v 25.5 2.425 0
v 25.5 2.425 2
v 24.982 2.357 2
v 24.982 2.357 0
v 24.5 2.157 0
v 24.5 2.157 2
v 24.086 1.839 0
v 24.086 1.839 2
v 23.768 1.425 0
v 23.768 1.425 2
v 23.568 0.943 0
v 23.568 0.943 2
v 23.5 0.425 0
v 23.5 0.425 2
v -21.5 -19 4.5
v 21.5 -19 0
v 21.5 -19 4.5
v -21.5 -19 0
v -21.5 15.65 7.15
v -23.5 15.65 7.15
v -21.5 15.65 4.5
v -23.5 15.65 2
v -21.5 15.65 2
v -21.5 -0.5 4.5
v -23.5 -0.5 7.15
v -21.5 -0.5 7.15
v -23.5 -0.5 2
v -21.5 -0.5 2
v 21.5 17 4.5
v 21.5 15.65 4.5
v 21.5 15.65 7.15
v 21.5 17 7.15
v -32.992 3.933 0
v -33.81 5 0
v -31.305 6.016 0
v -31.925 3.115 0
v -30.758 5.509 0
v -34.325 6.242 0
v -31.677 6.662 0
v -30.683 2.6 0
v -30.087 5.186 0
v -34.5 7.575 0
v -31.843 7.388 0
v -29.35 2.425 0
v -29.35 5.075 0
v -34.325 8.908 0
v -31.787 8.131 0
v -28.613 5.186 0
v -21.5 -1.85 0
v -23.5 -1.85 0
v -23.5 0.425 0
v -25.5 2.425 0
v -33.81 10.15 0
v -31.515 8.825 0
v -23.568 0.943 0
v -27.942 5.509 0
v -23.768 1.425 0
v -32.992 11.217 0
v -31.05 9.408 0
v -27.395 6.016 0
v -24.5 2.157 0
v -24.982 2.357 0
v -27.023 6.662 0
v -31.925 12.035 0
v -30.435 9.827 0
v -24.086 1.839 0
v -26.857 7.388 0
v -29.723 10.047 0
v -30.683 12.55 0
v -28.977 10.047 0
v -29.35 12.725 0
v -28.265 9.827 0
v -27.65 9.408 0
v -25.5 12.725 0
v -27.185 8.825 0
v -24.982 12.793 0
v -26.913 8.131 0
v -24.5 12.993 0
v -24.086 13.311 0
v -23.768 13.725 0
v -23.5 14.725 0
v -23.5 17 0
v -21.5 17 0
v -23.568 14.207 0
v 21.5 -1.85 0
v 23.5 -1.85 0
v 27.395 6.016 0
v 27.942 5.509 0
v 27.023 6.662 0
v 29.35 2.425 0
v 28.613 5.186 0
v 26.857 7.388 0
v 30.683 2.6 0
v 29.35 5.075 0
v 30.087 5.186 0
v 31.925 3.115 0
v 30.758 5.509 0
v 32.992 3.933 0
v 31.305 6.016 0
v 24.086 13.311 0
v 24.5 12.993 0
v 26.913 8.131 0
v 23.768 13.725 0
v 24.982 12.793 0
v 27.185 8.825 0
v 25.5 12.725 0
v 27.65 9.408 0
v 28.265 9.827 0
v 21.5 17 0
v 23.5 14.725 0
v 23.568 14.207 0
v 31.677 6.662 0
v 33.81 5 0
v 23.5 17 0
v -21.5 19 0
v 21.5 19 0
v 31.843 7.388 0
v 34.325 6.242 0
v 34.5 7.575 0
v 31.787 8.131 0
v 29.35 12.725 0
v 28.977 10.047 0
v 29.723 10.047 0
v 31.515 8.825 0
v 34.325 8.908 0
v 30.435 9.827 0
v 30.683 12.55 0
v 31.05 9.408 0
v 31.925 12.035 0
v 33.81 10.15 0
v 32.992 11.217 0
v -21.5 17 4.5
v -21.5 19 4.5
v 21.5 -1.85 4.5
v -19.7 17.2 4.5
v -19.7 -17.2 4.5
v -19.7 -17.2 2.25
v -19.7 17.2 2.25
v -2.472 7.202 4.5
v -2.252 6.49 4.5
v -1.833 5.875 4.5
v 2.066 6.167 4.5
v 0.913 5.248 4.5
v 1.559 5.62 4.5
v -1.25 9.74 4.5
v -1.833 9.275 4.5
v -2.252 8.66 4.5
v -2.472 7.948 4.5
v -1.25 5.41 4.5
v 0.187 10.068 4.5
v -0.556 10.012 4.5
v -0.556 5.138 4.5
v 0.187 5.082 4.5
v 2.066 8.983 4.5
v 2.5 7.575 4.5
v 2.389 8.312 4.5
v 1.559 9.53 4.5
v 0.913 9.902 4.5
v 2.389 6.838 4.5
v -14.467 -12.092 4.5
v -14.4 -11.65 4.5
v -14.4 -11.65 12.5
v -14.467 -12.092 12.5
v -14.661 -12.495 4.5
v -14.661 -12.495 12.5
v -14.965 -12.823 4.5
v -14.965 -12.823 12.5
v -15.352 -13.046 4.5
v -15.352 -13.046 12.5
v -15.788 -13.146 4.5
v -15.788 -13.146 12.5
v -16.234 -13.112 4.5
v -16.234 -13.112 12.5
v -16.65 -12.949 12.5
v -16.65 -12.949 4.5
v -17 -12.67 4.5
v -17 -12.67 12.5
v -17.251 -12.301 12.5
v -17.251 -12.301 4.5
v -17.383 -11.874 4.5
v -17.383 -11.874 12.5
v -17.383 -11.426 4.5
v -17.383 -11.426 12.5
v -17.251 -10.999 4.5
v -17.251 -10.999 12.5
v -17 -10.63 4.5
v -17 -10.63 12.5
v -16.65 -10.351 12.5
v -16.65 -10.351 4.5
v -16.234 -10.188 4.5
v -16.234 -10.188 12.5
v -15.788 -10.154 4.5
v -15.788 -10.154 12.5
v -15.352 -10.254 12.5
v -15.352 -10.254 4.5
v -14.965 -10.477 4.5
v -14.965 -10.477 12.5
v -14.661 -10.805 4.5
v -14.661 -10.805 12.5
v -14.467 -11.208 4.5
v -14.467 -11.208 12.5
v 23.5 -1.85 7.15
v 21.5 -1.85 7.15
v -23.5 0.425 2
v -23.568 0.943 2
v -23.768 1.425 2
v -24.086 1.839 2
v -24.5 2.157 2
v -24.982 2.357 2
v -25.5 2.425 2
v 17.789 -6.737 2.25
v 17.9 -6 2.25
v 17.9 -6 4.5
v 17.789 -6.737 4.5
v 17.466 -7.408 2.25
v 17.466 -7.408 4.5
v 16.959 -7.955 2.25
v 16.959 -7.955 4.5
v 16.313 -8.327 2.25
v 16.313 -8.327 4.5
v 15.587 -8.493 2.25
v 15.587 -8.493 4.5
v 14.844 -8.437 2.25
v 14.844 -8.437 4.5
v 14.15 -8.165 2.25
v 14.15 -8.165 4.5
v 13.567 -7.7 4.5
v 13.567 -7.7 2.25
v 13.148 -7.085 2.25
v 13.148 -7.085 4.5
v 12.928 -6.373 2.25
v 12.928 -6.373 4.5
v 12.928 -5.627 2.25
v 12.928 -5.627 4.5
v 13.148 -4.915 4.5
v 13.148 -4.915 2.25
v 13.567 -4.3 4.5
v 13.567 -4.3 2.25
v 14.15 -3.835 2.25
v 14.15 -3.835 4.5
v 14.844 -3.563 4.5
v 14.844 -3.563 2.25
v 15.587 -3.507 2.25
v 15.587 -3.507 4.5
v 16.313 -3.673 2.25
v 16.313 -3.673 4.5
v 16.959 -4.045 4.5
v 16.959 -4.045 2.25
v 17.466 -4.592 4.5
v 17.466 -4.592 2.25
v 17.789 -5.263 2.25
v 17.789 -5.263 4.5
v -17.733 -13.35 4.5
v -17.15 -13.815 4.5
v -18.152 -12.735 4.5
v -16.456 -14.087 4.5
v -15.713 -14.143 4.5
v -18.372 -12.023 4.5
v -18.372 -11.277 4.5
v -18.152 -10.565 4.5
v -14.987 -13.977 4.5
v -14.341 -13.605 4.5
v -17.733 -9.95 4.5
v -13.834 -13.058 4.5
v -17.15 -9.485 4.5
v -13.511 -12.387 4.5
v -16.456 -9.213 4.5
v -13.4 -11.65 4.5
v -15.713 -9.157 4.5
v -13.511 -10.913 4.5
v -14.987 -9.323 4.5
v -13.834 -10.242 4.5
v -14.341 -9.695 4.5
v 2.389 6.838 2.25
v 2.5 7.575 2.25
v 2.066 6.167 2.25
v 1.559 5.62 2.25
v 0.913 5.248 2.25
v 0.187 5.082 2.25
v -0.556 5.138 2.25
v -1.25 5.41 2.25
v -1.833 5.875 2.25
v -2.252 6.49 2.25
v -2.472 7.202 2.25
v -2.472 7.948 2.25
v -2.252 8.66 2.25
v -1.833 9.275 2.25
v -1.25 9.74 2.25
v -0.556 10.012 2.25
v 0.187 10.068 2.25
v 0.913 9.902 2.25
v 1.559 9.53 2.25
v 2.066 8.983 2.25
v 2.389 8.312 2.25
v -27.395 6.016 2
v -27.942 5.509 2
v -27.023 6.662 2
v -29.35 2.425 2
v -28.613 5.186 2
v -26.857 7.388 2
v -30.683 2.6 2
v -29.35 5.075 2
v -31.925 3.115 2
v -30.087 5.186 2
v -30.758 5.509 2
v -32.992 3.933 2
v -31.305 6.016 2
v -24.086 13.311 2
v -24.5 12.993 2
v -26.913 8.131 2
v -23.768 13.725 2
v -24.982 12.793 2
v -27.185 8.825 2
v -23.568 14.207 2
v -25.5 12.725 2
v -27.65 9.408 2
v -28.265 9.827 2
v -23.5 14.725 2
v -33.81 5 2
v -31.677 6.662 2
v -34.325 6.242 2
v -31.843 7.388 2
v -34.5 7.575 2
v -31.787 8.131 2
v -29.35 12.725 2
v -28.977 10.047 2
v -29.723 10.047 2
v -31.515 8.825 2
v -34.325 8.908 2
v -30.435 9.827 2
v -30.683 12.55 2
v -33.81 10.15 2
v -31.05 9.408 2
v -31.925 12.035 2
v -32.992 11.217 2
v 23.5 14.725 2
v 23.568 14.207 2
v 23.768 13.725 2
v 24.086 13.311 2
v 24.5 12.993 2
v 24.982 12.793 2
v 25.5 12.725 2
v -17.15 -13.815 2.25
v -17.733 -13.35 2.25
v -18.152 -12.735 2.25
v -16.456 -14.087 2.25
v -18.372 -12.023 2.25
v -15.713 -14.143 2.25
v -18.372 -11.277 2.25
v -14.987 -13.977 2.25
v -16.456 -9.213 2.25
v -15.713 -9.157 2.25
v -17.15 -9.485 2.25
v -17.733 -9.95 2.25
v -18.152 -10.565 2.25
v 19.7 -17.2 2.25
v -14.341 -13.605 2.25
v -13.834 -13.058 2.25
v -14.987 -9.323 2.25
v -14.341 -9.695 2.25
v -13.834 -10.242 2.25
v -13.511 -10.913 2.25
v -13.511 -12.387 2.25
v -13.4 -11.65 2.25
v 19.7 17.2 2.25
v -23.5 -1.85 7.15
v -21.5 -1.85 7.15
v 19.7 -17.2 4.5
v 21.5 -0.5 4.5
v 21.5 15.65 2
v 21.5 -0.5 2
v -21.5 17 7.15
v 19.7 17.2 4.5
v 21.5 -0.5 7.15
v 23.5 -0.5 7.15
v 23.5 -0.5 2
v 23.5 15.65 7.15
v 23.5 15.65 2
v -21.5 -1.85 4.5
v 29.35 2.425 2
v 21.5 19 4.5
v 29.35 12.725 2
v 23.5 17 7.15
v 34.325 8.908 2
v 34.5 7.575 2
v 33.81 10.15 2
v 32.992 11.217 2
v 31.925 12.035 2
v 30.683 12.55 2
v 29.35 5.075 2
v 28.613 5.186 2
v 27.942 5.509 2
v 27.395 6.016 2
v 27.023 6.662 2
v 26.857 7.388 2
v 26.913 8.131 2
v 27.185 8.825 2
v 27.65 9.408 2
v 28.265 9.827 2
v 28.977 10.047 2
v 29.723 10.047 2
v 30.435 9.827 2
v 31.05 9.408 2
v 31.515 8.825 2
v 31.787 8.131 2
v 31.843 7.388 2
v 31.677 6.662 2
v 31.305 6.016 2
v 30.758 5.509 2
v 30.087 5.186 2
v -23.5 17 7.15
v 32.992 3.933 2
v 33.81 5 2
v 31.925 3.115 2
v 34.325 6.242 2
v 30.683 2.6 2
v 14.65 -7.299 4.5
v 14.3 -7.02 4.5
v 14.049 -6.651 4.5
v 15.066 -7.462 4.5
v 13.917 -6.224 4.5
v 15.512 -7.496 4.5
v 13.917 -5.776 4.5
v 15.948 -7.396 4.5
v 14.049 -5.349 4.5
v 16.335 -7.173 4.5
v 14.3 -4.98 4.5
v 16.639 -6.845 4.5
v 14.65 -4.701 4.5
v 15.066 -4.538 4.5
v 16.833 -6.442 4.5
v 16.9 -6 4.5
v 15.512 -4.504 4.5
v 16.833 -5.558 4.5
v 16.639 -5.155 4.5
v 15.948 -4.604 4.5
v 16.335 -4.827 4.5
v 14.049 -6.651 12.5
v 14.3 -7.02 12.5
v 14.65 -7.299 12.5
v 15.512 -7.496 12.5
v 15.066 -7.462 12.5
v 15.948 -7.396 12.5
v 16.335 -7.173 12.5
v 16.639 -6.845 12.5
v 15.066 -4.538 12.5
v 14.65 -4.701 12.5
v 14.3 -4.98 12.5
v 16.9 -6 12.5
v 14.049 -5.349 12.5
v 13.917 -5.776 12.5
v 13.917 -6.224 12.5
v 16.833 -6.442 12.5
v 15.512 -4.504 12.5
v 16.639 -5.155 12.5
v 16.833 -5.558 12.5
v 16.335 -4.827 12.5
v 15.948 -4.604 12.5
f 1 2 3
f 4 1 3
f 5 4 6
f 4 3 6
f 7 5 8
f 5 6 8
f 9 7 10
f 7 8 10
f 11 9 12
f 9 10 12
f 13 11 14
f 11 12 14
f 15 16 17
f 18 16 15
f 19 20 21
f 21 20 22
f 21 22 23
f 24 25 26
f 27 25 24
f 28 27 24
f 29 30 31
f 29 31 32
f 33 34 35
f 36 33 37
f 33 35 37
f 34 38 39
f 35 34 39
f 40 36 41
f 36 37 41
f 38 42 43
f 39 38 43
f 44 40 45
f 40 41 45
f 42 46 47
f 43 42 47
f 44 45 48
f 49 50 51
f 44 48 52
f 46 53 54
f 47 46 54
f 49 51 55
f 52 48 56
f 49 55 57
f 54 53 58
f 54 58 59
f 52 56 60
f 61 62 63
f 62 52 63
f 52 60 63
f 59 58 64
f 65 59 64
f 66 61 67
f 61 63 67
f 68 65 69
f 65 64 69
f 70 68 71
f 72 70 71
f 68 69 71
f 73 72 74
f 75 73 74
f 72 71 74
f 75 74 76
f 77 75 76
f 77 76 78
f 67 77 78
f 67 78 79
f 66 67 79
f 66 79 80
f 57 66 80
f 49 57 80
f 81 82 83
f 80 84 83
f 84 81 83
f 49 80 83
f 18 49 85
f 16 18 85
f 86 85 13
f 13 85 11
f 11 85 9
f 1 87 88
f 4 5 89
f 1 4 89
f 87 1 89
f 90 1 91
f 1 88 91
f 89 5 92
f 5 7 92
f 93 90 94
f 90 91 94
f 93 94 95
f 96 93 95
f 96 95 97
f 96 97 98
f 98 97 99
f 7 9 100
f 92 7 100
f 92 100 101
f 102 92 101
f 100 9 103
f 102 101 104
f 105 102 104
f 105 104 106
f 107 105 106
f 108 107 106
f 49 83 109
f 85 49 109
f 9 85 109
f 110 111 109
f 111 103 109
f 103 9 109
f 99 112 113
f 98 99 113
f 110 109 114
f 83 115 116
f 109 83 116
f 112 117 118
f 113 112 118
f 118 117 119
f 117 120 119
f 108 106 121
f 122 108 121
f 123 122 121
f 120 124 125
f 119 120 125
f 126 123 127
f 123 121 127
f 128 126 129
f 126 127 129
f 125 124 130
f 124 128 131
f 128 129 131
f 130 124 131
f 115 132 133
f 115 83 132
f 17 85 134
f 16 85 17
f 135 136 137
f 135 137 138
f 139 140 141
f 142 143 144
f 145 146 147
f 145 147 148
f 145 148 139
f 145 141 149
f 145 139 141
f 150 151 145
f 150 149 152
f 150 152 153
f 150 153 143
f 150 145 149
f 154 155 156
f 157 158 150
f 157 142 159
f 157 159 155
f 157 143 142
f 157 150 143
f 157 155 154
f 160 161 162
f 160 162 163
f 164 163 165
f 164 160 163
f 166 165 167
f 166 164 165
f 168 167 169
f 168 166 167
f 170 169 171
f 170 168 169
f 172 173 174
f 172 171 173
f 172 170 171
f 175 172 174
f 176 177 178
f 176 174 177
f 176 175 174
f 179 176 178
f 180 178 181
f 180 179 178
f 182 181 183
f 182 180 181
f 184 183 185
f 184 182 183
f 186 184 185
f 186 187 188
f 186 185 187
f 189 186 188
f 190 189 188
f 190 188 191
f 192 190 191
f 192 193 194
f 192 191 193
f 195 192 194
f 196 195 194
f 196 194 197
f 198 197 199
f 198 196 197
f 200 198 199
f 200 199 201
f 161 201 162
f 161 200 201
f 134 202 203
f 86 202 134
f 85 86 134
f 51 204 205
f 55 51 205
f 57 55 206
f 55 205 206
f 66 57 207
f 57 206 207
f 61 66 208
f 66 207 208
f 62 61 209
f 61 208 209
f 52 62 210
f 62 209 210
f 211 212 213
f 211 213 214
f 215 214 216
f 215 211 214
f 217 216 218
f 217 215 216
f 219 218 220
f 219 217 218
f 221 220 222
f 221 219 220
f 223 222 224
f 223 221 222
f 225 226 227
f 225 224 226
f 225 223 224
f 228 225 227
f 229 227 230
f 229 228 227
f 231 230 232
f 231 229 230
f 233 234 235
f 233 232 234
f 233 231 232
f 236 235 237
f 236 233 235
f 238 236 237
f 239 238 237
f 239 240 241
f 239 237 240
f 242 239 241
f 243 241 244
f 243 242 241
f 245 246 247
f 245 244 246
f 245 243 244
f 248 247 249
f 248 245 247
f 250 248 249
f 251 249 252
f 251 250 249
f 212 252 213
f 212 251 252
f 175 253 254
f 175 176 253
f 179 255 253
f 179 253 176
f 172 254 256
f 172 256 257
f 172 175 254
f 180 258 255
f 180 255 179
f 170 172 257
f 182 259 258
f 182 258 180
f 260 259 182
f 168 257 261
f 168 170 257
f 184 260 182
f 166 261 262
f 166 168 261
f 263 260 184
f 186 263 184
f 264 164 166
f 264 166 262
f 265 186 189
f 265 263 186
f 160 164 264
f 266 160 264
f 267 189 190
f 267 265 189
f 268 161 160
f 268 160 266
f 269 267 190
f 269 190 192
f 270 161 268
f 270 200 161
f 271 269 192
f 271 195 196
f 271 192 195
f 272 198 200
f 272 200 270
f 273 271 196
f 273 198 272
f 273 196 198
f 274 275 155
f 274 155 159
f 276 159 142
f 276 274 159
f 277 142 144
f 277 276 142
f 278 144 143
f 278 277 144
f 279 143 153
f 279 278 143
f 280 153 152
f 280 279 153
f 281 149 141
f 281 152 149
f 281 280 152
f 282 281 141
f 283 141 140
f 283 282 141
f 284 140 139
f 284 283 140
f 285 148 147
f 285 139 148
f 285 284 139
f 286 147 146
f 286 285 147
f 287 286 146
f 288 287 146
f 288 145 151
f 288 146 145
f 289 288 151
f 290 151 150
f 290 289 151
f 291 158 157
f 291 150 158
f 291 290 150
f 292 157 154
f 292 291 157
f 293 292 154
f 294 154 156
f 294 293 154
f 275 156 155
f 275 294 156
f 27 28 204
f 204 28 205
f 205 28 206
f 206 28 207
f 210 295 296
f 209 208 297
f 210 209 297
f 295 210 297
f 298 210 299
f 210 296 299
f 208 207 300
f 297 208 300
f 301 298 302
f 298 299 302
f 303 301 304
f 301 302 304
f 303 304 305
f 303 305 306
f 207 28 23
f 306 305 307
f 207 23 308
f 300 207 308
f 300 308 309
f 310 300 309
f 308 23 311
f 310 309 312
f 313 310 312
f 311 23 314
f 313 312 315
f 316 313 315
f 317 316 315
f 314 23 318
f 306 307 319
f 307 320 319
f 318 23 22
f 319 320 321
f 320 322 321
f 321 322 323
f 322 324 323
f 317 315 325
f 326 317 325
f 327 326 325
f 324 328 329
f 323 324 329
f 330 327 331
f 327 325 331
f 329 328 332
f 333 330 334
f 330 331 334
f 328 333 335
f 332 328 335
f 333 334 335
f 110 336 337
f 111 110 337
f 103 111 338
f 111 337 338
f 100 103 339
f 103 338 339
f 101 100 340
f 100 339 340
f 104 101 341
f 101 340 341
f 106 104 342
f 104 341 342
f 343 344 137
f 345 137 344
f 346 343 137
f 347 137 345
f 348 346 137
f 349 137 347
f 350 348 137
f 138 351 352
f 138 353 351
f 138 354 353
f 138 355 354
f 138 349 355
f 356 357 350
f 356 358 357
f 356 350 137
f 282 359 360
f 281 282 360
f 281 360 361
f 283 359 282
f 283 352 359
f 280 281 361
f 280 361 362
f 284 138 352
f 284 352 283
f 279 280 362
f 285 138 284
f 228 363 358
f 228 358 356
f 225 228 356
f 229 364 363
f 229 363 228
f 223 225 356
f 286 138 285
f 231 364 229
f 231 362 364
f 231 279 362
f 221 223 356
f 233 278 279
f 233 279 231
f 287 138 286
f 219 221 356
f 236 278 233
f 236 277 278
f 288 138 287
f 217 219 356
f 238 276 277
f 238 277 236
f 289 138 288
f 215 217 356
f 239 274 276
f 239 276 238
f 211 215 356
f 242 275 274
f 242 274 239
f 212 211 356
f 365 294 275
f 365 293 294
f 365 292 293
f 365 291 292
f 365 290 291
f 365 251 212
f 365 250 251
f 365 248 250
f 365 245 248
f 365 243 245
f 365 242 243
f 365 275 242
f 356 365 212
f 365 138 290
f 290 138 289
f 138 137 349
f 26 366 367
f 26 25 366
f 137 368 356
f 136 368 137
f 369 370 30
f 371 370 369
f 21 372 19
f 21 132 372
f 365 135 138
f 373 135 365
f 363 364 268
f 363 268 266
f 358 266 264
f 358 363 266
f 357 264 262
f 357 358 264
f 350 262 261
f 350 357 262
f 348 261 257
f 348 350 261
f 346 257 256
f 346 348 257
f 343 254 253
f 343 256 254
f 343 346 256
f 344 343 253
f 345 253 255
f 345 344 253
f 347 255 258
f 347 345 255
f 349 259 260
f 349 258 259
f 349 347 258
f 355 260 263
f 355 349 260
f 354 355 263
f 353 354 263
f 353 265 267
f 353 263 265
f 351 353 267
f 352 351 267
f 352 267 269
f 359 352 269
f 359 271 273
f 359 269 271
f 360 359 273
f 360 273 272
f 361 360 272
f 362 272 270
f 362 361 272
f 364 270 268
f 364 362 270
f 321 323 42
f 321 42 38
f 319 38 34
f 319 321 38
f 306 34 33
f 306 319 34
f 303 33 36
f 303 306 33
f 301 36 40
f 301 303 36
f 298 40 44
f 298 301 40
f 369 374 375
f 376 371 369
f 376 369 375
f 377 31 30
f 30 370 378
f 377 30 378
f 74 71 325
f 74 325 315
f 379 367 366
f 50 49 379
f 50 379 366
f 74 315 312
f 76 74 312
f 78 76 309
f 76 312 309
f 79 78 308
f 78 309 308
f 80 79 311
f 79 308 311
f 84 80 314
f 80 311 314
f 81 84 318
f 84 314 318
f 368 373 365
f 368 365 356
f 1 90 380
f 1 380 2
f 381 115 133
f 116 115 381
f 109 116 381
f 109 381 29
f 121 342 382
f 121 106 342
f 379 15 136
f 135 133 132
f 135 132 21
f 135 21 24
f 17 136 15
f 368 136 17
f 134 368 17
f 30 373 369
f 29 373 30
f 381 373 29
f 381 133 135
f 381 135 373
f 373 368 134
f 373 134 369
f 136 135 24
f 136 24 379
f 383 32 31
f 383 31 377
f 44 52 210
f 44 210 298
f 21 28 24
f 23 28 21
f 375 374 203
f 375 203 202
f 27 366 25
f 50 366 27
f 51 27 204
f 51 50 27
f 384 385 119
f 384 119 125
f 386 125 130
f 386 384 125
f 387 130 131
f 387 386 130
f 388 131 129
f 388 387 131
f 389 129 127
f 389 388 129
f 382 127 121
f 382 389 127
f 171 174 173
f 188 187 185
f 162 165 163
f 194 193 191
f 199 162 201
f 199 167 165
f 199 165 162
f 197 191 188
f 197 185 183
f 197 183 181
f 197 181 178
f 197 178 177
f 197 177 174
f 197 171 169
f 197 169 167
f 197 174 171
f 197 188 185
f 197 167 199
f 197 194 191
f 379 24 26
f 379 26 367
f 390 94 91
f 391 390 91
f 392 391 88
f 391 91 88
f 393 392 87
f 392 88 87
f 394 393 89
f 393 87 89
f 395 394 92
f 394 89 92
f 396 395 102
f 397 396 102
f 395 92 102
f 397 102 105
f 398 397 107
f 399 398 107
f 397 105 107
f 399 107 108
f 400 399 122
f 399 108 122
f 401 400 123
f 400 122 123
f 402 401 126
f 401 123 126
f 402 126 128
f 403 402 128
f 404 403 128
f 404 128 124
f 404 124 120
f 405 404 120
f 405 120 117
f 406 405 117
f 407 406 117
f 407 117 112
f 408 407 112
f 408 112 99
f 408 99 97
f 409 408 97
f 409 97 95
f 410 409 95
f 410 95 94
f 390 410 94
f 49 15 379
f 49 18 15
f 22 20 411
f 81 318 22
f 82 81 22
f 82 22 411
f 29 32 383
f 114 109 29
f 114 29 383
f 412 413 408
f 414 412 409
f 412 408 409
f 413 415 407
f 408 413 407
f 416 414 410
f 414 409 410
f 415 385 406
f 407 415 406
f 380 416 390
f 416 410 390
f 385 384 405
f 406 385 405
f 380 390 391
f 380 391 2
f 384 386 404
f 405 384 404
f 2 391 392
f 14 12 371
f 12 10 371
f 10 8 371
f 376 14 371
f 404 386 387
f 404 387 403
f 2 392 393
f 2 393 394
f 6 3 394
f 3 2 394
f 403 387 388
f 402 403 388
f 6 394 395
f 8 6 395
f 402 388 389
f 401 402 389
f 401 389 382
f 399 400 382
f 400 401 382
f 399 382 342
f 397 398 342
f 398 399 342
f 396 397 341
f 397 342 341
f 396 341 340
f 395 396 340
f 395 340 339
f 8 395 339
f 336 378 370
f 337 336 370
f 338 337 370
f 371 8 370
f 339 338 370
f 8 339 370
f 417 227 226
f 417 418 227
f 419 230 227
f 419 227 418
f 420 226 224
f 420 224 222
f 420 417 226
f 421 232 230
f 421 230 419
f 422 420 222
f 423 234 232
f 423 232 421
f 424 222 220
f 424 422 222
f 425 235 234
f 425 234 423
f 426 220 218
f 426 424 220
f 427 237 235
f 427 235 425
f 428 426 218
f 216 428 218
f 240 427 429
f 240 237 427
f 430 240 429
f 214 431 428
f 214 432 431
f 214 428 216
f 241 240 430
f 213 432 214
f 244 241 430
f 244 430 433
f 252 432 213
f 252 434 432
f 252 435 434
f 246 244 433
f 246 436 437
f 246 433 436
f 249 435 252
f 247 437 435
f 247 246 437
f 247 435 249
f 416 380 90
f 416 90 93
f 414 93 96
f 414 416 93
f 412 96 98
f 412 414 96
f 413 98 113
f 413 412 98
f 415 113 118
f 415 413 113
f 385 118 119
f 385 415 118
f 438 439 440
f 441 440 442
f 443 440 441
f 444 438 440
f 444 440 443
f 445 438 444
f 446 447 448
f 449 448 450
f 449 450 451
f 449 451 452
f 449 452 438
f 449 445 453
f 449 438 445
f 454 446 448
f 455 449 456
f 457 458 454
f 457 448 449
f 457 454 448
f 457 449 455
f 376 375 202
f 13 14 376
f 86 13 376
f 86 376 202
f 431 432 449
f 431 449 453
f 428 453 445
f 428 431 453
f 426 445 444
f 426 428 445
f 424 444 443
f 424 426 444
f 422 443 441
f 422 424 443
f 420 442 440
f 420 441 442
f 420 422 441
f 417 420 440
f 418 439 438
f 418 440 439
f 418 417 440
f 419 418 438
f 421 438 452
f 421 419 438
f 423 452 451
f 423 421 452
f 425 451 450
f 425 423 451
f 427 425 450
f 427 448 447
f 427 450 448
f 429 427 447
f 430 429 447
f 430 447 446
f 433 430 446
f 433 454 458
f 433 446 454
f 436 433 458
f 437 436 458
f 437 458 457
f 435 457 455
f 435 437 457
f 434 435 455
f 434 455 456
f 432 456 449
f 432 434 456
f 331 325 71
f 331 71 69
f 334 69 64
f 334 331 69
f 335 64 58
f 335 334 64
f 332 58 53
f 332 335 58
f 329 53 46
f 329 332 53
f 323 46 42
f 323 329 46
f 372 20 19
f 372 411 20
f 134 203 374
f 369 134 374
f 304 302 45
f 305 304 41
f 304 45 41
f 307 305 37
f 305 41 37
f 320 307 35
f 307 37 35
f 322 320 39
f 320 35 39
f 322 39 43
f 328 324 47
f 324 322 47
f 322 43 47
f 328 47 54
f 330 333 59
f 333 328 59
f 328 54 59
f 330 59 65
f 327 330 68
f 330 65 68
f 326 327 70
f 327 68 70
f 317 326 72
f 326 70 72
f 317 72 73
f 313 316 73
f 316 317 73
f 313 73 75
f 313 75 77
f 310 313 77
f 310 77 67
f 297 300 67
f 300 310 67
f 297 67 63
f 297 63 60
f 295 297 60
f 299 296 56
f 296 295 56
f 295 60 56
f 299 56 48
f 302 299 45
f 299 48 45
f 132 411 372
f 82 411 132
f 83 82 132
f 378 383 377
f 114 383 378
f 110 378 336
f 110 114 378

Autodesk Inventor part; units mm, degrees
ref_plane "YZ Plane" through (0, 0, 0) normal (1, 0, 0) x (0, 1, 0)
ref_plane "XZ Plane" through (0, 0, 0) normal (0, 1, 0) x (-1, 0, 0)
ref_plane "XY Plane" through (0, 0, 0) normal (0, 0, 1) x (1, 0, 0)
sketch "Sketch1" plane through (0, 0, 0) normal (0, 0, 1) x (1, 0, 0)
  line L0 (-21.5, 19) -> (21.5, 19)
  line L1 (21.5, 19) -> (21.5, -19)
  line L2 (21.5, -19) -> (-21.5, -19)
  line L3 (-21.5, -19) -> (-21.5, 19)
  line L4 (0, 0) -> (0, 19) construction
  line L5 (0, 0) -> (0, -19) construction
  line L6 (0, 0) -> (21.5, 0) construction
  line L7 (0, 0) -> (-21.5, 0) construction
  dimension "d0" = 43
  dimension "d1" = 38
extrude "Extrusion1" add sketch "Sketch1" along normal blind 4.5
sketch "Sketch2" plane through (0, 0, 4.5) normal (0, 0, 1) x (1, 0, 0)
  line L0 (21.5, 19) -> (21.5, -19) projected
  line L1 (-21.5, 19) -> (21.5, 19) projected
  line L2 (-21.5, -19) -> (-21.5, 19) projected
  line L3 (21.5, -19) -> (-21.5, -19) projected
  line L4 (19.7, 17.2) -> (19.7, -17.2)
  line L5 (19.7, -17.2) -> (-19.7, -17.2)
  line L6 (-19.7, -17.2) -> (-19.7, 17.2)
  line L7 (-19.7, 17.2) -> (19.7, 17.2)
  dimension "d4" = 1.8
extrude "Extrusion2" cut sketch "Sketch2" against normal blind 2.25 contours L4 L5 L6 L7
sketch "Sketch3" plane through (0, 0, 0) normal (0, 0, -1) x (-1, 0, 0)
  line L0 (21.5, 19) -> (-21.5, 19) projected
  line L1 (-21.5, 19) -> (-21.5, -19) projected
  line L2 (-21.5, 17) -> (-23.5, 17)
  line L3 (-23.5, 17) -> (-23.5, 12.725)
  line L4 (-23.5, 12.725) -> (-34.5, 12.725)
  line L5 (-34.5, 12.725) -> (-34.5, 2.425)
  line L6 (-34.5, 2.425) -> (-23.5, 2.425)
  line L7 (-23.5, 2.425) -> (-23.5, -1.85)
  line L8 (-23.5, -1.85) -> (-21.5, -1.85)
  dimension "d7" = 2
  dimension "d8" = 2
  dimension "d9" = 18.85
  dimension "d10" = 10.3
  dimension "d11" = 13
extrude "Extrusion3" add sketch "Sketch3" against normal blind 2
fillet "Fillet1" radius 5.15 2 edges at (34.5, 2.425, 1) (34.5, 12.725, 1)
fillet "Fillet1" radius 2 2 edges at (23.5, 2.425, 1) (23.5, 12.725, 1)
sketch "Sketch4" plane through (0, 0, 2) normal (0, 0, 1) x (1, 0, 0)
  arc A0 (29.35, 2.425) -> (29.35, 12.725) centre (29.35, 7.575) ccw projected
hole "Hole1" at (29.35, 7.575, 2) direction (0, 0, -1) diameter 5 end through all
sketch "Sketch5" plane through (0, 0, 2) normal (0, 0, 1) x (1, 0, 0)
  line L0 (21.5, -1.85) -> (21.5, 17) projected
  line L1 (23.5, -1.85) -> (21.5, -1.85)
  line L2 (21.5, -1.85) -> (21.5, -0.5)
  line L3 (21.5, -0.5) -> (23.5, -0.5)
  line L4 (23.5, -0.5) -> (23.5, -1.85)
  line L5 (23.5, 17) -> (21.5, 17)
  line L6 (21.5, 17) -> (21.5, 15.65)
  line L7 (21.5, 15.65) -> (23.5, 15.65)
  line L8 (23.5, 15.65) -> (23.5, 17)
  dimension "d23" = 1.35
extrude "Extrusion4" add sketch "Sketch5" along normal blind 5.15
mirror "Mirror1" about plane through (0, 0, 0) normal (1, 0, 0) of "Extrusion4", "Hole1", "Extrusion3", "Fillet1"
sketch "Sketch6" plane through (0, 0, 2.25) normal (0, 0, 1) x (1, 0, 0)
  circle A0 centre (0, 7.575) radius 2.5
  line L0 (-21.5, 19) -> (21.5, 19) projected
  circle A1 centre (-29.35, 7.575) radius 2.5 projected
  point P0 (0, 0)
  dimension "d26" = 5
extrude "Extrusion5" add sketch "Sketch6" along normal up to surface (2.25 mm away) contours A0
sketch "Sketch7" plane through (0, 0, 2.25) normal (0, 0, 1) x (1, 0, 0)
  circle A0 centre (-15.9, -11.65) radius 2.5
  circle A1 centre (15.4, -6) radius 2.5
  line L0 (-21.5, -19) -> (-21.5, -1.85) projected
  line L1 (21.5, -19) -> (-21.5, -19) projected
  line L2 (21.5, -1.85) -> (21.5, -19) projected
  dimension "d30" = 5
  dimension "d31" = 5.6
  dimension "d32" = 7.35
  dimension "d33" = 6.1
  dimension "d34" = 13
extrude "Extrusion6" add sketch "Sketch7" along normal up to surface (2.25 mm away)
sketch "Sketch8" plane through (-15.9, -11.65, 4.5) normal (0, 0, 1) x (1, 0, 0)
  circle A0 centre (0, 0) radius 2.5 projected
  circle A1 centre (0, 0) radius 1.5
  circle A2 centre (31.3, 5.65) radius 2.5 projected
  circle A3 centre (31.3, 5.65) radius 1.5
  dimension "d37" = 3
extrude "Extrusion7" add sketch "Sketch8" along normal blind 8 contours A1 | A3
properties part number "Spike Bottom Cover" material "ABS Plastic"
